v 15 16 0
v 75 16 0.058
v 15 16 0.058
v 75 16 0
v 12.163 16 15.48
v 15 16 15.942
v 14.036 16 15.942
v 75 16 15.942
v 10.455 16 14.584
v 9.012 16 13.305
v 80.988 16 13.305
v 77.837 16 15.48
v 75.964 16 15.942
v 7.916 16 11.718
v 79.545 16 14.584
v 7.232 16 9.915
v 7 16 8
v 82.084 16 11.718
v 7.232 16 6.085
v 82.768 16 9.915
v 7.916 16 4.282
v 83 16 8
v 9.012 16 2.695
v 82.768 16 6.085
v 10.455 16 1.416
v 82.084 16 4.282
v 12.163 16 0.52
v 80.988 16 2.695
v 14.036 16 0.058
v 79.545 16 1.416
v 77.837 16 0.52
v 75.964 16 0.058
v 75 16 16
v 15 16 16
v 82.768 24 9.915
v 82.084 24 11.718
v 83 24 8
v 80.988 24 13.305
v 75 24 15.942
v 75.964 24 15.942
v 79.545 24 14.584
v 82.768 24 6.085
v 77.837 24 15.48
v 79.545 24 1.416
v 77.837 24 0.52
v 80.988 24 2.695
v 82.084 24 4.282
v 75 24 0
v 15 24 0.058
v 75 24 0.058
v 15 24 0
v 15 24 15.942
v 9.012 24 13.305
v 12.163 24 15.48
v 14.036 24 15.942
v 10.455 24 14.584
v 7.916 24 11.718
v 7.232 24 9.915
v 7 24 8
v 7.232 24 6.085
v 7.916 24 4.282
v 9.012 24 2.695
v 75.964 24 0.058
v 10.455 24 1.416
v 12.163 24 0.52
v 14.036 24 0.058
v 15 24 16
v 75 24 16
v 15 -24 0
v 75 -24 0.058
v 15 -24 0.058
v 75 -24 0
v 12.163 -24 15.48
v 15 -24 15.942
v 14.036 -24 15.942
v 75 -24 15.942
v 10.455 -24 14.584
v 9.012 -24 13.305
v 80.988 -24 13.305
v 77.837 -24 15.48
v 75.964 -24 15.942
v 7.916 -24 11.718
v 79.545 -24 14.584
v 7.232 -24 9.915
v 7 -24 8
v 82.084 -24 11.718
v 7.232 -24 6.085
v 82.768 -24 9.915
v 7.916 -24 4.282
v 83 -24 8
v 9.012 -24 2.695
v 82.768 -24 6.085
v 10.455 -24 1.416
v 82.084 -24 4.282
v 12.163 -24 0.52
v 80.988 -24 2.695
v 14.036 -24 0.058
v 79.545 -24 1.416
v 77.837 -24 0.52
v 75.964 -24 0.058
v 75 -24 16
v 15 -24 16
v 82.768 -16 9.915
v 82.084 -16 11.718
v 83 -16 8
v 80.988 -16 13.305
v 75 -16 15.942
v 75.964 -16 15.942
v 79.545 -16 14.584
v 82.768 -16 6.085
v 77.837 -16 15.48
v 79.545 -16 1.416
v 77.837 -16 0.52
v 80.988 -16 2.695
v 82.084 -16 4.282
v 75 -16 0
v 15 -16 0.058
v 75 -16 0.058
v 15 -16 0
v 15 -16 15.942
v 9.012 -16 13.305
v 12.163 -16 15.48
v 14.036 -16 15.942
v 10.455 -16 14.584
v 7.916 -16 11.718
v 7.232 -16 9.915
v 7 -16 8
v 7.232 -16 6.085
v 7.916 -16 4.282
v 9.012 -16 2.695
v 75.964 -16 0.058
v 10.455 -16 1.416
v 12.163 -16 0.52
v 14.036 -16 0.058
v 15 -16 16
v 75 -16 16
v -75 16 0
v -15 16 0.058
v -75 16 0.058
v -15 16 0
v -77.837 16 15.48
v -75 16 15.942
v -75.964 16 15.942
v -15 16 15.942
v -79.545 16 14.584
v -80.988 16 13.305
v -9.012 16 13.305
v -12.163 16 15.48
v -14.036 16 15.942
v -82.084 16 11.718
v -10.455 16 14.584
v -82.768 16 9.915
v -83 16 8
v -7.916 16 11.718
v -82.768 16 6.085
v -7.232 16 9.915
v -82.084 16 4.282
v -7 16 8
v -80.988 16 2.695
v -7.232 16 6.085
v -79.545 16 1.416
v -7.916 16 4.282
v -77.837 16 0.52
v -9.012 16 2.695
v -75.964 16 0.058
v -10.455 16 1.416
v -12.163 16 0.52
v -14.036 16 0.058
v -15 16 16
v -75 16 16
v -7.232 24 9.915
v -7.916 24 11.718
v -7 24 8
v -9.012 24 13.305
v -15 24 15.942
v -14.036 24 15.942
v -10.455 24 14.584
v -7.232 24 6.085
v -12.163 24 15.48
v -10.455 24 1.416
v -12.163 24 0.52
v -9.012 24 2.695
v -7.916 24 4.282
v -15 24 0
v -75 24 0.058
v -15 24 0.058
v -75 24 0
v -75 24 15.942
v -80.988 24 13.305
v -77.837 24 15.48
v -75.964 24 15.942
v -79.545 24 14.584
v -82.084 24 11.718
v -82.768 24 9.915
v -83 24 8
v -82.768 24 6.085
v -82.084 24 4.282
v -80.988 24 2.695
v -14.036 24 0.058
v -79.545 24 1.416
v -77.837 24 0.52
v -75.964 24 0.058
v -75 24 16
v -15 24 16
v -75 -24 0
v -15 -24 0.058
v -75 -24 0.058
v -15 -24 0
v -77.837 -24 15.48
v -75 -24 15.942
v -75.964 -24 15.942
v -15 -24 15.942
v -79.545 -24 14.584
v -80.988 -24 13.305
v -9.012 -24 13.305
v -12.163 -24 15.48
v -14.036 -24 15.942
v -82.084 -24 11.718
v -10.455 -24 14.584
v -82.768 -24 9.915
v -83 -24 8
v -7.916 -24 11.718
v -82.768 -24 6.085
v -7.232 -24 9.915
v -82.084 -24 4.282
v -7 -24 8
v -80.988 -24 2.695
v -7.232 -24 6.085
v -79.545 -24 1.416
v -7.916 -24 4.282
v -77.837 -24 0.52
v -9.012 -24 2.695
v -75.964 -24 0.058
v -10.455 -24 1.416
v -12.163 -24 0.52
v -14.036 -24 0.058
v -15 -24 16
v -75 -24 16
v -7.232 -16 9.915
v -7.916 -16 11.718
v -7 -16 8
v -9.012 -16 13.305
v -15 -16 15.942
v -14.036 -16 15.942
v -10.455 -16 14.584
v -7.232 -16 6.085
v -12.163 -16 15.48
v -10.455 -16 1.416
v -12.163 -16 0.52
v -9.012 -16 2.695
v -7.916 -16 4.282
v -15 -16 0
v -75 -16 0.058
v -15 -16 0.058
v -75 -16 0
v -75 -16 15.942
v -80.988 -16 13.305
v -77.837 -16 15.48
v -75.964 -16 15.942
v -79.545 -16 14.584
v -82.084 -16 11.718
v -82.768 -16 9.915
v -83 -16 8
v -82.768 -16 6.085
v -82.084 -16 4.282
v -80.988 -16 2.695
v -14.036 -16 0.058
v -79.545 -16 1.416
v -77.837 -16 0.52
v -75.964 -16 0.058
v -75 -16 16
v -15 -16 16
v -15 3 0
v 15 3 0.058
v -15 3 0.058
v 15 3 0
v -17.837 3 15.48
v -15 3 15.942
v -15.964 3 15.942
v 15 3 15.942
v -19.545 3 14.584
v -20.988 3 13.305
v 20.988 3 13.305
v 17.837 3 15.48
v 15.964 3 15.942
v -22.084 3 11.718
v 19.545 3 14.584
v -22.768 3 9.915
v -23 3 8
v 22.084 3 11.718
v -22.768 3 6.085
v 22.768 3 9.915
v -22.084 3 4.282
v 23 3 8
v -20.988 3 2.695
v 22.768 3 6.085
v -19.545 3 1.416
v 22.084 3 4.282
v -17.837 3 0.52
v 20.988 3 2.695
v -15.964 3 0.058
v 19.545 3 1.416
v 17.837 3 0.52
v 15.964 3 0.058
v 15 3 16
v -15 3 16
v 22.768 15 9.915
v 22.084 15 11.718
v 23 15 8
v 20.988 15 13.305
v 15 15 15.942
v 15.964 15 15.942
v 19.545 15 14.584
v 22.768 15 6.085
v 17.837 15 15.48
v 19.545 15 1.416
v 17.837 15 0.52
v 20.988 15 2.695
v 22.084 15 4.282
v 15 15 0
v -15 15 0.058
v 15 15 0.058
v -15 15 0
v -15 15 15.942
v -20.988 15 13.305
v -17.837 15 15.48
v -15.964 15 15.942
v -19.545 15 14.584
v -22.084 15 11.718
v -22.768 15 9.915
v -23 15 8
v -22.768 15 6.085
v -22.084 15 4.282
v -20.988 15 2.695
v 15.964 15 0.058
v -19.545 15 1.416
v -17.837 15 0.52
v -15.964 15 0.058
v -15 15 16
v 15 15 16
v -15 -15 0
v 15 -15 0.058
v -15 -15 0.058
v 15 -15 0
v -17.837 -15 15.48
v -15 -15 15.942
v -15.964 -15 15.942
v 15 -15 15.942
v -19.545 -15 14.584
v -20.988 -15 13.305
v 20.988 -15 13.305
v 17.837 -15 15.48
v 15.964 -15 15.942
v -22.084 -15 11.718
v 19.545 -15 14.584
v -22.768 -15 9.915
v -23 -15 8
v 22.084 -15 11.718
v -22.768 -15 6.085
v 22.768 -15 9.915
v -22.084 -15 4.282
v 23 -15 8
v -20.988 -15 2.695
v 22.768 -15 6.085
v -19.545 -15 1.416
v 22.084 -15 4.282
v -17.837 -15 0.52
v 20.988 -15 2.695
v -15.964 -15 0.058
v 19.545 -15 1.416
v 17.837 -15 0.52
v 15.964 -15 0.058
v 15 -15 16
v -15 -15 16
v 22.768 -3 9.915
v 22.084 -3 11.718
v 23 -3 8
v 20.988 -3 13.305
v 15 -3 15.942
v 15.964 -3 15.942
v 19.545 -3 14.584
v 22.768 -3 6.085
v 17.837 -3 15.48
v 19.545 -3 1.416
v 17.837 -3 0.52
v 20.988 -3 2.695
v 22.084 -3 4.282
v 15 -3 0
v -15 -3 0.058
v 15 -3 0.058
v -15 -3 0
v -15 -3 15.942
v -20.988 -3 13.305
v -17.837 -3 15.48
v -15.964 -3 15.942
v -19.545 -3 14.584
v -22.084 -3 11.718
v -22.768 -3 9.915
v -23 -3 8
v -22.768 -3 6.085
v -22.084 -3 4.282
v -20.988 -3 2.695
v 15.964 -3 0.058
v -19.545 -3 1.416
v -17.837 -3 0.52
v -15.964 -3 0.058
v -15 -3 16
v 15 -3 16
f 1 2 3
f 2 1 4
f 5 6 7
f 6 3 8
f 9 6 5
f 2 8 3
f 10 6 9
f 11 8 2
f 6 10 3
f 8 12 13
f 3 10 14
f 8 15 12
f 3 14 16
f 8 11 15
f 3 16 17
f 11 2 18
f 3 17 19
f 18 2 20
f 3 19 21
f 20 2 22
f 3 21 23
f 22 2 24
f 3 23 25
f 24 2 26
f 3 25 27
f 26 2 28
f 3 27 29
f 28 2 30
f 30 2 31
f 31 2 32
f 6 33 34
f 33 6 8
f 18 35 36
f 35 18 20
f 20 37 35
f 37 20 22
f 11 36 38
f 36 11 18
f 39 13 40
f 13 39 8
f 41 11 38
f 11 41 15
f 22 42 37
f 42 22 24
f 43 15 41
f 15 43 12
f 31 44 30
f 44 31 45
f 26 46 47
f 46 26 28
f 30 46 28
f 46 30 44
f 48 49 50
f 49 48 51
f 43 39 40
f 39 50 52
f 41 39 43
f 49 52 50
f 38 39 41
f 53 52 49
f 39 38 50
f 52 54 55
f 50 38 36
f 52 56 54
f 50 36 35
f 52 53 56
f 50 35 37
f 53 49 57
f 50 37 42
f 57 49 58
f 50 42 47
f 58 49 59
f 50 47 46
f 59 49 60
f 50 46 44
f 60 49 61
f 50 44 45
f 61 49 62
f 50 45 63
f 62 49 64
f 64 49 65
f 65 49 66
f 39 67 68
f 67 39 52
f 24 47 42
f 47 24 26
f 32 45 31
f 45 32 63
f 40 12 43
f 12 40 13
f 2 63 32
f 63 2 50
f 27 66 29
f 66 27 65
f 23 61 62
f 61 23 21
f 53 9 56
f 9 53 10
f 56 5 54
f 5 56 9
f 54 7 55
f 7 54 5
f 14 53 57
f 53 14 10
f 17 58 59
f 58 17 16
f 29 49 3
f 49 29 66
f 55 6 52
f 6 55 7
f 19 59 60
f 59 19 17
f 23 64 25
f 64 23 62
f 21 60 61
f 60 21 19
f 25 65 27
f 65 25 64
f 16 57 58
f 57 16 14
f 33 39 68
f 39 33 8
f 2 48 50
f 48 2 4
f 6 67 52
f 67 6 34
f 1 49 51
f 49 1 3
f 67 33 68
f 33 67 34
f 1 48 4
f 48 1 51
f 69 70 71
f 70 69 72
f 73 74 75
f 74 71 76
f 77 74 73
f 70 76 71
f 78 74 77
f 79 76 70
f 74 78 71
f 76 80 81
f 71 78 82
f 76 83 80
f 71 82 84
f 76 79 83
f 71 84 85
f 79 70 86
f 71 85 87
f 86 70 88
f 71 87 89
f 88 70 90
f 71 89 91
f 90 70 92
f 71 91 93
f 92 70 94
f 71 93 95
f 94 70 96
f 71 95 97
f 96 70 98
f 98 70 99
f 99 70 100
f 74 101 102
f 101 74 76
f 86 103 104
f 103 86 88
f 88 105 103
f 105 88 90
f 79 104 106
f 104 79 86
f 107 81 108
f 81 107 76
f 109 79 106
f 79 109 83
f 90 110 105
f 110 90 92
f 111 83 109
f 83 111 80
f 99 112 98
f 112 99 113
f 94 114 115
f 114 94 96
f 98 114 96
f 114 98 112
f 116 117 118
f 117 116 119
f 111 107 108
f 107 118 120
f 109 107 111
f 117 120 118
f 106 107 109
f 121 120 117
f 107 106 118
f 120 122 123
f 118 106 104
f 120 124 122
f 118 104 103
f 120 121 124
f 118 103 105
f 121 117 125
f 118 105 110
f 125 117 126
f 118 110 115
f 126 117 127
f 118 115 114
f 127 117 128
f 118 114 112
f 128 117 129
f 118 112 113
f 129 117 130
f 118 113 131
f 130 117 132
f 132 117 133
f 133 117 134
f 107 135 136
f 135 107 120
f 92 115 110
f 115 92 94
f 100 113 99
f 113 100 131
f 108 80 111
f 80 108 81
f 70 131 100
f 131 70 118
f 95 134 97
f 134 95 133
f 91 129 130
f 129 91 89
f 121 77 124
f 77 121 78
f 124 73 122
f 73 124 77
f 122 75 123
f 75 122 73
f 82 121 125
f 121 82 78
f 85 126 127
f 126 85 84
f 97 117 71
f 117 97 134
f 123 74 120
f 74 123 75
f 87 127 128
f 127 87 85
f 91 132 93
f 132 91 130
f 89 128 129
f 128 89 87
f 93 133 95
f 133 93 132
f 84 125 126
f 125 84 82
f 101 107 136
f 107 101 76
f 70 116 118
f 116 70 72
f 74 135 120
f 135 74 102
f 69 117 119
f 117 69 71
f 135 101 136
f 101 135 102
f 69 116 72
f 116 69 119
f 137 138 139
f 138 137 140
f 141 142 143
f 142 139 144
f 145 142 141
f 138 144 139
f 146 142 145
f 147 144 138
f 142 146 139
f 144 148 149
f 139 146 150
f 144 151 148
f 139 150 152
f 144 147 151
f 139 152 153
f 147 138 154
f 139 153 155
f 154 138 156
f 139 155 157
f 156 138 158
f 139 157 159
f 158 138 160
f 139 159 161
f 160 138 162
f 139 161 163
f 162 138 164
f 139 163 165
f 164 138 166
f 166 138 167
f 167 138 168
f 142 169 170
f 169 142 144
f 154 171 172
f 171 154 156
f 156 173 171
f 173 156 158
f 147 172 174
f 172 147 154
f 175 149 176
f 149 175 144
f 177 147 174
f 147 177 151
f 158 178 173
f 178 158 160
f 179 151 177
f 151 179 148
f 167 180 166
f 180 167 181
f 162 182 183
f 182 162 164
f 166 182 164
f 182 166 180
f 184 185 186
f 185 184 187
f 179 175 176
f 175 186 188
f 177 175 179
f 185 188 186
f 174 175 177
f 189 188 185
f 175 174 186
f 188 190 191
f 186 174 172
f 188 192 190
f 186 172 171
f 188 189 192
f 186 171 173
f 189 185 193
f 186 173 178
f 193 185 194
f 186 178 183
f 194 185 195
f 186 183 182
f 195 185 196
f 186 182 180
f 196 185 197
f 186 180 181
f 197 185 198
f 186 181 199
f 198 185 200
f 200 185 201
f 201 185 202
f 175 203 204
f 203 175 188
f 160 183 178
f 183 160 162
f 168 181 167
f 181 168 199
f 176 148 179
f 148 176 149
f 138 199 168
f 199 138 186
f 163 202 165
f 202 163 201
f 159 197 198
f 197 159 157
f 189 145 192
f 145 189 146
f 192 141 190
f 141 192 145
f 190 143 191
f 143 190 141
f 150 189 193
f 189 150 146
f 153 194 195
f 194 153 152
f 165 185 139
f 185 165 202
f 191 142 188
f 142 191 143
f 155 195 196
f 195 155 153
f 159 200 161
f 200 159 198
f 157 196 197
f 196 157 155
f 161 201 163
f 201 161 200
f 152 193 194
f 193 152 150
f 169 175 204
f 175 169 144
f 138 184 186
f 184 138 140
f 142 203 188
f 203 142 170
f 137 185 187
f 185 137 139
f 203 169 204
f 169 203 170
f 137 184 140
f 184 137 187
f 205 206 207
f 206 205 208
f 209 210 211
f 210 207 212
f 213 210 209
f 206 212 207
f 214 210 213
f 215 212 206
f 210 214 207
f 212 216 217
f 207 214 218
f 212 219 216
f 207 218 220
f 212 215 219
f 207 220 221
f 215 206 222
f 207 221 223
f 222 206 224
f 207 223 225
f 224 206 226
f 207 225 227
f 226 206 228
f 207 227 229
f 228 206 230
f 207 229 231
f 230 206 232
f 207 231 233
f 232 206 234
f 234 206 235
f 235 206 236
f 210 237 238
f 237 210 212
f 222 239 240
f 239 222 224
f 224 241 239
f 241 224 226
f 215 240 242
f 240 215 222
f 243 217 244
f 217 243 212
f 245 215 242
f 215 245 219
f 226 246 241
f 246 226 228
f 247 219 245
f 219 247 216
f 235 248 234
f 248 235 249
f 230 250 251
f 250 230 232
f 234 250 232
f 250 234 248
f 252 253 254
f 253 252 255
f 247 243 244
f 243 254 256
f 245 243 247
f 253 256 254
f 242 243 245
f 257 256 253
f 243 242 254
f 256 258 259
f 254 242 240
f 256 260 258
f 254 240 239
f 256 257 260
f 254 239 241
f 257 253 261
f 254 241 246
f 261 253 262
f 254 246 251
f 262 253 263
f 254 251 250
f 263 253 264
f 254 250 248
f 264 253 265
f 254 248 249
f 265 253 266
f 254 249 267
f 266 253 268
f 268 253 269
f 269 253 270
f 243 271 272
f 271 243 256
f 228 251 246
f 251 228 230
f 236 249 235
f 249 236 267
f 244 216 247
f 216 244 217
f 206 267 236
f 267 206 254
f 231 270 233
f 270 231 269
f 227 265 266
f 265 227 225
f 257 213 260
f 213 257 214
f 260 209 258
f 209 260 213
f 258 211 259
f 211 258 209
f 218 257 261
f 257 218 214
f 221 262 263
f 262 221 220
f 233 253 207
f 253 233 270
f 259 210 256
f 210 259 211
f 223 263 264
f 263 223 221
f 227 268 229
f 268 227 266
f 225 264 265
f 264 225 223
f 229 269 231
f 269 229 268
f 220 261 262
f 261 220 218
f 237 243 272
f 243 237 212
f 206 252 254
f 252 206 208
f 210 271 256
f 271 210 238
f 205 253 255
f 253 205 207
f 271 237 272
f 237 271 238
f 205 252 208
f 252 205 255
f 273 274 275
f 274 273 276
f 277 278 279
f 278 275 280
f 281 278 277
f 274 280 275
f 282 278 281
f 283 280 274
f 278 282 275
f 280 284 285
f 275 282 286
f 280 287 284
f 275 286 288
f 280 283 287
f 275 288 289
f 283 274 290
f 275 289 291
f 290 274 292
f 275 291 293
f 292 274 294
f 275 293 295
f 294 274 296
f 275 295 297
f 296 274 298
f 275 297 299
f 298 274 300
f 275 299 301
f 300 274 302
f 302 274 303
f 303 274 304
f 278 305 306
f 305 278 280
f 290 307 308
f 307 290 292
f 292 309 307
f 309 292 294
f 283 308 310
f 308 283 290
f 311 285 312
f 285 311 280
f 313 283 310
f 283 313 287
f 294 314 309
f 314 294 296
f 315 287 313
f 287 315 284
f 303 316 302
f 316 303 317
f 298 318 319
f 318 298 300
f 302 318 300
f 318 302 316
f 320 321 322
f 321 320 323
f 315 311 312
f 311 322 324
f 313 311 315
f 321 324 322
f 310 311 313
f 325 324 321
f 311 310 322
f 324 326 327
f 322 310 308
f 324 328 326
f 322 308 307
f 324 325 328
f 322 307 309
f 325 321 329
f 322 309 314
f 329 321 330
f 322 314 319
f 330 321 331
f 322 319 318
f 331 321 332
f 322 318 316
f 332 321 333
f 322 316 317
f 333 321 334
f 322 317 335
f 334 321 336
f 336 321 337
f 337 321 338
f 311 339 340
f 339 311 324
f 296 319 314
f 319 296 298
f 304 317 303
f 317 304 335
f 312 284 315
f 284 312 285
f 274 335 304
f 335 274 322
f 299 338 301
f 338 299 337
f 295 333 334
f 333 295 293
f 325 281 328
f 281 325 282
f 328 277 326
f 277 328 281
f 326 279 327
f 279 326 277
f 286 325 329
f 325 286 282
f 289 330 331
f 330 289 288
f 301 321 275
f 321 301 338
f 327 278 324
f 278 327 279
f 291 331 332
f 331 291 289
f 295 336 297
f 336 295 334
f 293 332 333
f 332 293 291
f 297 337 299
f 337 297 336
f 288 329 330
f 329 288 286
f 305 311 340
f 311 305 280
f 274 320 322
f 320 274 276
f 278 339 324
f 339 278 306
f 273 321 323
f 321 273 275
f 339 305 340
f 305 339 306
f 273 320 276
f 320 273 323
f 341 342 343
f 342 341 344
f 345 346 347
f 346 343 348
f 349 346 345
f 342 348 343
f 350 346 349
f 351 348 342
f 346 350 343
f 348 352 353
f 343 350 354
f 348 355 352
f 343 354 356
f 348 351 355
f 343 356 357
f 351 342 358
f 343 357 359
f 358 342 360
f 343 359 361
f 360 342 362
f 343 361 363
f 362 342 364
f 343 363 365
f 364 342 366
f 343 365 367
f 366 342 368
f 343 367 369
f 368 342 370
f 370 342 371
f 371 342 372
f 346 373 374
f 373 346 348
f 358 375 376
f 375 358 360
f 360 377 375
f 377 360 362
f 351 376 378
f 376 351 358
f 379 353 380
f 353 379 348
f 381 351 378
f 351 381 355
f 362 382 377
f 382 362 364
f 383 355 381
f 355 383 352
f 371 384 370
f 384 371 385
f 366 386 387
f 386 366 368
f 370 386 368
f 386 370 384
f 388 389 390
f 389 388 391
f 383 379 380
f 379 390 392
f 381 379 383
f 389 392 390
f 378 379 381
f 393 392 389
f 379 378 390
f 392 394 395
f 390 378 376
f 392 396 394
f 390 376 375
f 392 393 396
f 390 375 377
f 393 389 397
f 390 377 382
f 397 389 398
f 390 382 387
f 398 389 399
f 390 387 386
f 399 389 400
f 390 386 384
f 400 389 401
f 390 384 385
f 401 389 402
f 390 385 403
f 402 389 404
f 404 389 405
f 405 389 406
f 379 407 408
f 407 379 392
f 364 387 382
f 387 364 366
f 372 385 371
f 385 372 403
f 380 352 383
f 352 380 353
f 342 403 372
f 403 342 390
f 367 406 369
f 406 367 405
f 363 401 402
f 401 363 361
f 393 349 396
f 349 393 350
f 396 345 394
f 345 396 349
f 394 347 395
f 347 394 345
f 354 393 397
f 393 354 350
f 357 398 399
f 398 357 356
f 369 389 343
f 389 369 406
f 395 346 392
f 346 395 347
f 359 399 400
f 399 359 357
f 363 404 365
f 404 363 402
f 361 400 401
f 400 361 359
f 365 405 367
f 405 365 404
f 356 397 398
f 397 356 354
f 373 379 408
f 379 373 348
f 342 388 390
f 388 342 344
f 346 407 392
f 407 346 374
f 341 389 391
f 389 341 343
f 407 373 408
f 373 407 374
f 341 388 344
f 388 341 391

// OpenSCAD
module oval(clength, cradius, cthick) {
	rotate([90,0,0]) union() {
		translate([clength/2,0,0]) cylinder(h = cthick,r = cradius, center = true);
		translate([-clength/2,0,0]) cylinder(h = cthick, r = cradius, center = true);
		cube(size = [clength, cradius*2, cthick], center = true);
	}
}
module caterpillar(clength, cradius, cthick) {
	color([0.1,0.1,0.1,1]) {
		difference() {
			oval(clength, cradius, cthick);
			oval(clength, cradius*0.9, cthick*1.1);
		}
	}
	color([0.8,0.8,0.8,1]) {
		oval(clength, cradius*0.9, cthick);
	}
}

translate([15+30, 20, 8]) caterpillar(60, 8, 8);
translate([15+30, -20, 8]) caterpillar(60, 8, 8);
translate([-(15+30), 20, 8]) caterpillar(60, 8, 8);
translate([-(15+30), -20, 8]) caterpillar(60, 8, 8);
translate([0, 9, 8]) caterpillar(30, 8, 12);
translate([0, -9, 8]) caterpillar(30, 8, 12);
